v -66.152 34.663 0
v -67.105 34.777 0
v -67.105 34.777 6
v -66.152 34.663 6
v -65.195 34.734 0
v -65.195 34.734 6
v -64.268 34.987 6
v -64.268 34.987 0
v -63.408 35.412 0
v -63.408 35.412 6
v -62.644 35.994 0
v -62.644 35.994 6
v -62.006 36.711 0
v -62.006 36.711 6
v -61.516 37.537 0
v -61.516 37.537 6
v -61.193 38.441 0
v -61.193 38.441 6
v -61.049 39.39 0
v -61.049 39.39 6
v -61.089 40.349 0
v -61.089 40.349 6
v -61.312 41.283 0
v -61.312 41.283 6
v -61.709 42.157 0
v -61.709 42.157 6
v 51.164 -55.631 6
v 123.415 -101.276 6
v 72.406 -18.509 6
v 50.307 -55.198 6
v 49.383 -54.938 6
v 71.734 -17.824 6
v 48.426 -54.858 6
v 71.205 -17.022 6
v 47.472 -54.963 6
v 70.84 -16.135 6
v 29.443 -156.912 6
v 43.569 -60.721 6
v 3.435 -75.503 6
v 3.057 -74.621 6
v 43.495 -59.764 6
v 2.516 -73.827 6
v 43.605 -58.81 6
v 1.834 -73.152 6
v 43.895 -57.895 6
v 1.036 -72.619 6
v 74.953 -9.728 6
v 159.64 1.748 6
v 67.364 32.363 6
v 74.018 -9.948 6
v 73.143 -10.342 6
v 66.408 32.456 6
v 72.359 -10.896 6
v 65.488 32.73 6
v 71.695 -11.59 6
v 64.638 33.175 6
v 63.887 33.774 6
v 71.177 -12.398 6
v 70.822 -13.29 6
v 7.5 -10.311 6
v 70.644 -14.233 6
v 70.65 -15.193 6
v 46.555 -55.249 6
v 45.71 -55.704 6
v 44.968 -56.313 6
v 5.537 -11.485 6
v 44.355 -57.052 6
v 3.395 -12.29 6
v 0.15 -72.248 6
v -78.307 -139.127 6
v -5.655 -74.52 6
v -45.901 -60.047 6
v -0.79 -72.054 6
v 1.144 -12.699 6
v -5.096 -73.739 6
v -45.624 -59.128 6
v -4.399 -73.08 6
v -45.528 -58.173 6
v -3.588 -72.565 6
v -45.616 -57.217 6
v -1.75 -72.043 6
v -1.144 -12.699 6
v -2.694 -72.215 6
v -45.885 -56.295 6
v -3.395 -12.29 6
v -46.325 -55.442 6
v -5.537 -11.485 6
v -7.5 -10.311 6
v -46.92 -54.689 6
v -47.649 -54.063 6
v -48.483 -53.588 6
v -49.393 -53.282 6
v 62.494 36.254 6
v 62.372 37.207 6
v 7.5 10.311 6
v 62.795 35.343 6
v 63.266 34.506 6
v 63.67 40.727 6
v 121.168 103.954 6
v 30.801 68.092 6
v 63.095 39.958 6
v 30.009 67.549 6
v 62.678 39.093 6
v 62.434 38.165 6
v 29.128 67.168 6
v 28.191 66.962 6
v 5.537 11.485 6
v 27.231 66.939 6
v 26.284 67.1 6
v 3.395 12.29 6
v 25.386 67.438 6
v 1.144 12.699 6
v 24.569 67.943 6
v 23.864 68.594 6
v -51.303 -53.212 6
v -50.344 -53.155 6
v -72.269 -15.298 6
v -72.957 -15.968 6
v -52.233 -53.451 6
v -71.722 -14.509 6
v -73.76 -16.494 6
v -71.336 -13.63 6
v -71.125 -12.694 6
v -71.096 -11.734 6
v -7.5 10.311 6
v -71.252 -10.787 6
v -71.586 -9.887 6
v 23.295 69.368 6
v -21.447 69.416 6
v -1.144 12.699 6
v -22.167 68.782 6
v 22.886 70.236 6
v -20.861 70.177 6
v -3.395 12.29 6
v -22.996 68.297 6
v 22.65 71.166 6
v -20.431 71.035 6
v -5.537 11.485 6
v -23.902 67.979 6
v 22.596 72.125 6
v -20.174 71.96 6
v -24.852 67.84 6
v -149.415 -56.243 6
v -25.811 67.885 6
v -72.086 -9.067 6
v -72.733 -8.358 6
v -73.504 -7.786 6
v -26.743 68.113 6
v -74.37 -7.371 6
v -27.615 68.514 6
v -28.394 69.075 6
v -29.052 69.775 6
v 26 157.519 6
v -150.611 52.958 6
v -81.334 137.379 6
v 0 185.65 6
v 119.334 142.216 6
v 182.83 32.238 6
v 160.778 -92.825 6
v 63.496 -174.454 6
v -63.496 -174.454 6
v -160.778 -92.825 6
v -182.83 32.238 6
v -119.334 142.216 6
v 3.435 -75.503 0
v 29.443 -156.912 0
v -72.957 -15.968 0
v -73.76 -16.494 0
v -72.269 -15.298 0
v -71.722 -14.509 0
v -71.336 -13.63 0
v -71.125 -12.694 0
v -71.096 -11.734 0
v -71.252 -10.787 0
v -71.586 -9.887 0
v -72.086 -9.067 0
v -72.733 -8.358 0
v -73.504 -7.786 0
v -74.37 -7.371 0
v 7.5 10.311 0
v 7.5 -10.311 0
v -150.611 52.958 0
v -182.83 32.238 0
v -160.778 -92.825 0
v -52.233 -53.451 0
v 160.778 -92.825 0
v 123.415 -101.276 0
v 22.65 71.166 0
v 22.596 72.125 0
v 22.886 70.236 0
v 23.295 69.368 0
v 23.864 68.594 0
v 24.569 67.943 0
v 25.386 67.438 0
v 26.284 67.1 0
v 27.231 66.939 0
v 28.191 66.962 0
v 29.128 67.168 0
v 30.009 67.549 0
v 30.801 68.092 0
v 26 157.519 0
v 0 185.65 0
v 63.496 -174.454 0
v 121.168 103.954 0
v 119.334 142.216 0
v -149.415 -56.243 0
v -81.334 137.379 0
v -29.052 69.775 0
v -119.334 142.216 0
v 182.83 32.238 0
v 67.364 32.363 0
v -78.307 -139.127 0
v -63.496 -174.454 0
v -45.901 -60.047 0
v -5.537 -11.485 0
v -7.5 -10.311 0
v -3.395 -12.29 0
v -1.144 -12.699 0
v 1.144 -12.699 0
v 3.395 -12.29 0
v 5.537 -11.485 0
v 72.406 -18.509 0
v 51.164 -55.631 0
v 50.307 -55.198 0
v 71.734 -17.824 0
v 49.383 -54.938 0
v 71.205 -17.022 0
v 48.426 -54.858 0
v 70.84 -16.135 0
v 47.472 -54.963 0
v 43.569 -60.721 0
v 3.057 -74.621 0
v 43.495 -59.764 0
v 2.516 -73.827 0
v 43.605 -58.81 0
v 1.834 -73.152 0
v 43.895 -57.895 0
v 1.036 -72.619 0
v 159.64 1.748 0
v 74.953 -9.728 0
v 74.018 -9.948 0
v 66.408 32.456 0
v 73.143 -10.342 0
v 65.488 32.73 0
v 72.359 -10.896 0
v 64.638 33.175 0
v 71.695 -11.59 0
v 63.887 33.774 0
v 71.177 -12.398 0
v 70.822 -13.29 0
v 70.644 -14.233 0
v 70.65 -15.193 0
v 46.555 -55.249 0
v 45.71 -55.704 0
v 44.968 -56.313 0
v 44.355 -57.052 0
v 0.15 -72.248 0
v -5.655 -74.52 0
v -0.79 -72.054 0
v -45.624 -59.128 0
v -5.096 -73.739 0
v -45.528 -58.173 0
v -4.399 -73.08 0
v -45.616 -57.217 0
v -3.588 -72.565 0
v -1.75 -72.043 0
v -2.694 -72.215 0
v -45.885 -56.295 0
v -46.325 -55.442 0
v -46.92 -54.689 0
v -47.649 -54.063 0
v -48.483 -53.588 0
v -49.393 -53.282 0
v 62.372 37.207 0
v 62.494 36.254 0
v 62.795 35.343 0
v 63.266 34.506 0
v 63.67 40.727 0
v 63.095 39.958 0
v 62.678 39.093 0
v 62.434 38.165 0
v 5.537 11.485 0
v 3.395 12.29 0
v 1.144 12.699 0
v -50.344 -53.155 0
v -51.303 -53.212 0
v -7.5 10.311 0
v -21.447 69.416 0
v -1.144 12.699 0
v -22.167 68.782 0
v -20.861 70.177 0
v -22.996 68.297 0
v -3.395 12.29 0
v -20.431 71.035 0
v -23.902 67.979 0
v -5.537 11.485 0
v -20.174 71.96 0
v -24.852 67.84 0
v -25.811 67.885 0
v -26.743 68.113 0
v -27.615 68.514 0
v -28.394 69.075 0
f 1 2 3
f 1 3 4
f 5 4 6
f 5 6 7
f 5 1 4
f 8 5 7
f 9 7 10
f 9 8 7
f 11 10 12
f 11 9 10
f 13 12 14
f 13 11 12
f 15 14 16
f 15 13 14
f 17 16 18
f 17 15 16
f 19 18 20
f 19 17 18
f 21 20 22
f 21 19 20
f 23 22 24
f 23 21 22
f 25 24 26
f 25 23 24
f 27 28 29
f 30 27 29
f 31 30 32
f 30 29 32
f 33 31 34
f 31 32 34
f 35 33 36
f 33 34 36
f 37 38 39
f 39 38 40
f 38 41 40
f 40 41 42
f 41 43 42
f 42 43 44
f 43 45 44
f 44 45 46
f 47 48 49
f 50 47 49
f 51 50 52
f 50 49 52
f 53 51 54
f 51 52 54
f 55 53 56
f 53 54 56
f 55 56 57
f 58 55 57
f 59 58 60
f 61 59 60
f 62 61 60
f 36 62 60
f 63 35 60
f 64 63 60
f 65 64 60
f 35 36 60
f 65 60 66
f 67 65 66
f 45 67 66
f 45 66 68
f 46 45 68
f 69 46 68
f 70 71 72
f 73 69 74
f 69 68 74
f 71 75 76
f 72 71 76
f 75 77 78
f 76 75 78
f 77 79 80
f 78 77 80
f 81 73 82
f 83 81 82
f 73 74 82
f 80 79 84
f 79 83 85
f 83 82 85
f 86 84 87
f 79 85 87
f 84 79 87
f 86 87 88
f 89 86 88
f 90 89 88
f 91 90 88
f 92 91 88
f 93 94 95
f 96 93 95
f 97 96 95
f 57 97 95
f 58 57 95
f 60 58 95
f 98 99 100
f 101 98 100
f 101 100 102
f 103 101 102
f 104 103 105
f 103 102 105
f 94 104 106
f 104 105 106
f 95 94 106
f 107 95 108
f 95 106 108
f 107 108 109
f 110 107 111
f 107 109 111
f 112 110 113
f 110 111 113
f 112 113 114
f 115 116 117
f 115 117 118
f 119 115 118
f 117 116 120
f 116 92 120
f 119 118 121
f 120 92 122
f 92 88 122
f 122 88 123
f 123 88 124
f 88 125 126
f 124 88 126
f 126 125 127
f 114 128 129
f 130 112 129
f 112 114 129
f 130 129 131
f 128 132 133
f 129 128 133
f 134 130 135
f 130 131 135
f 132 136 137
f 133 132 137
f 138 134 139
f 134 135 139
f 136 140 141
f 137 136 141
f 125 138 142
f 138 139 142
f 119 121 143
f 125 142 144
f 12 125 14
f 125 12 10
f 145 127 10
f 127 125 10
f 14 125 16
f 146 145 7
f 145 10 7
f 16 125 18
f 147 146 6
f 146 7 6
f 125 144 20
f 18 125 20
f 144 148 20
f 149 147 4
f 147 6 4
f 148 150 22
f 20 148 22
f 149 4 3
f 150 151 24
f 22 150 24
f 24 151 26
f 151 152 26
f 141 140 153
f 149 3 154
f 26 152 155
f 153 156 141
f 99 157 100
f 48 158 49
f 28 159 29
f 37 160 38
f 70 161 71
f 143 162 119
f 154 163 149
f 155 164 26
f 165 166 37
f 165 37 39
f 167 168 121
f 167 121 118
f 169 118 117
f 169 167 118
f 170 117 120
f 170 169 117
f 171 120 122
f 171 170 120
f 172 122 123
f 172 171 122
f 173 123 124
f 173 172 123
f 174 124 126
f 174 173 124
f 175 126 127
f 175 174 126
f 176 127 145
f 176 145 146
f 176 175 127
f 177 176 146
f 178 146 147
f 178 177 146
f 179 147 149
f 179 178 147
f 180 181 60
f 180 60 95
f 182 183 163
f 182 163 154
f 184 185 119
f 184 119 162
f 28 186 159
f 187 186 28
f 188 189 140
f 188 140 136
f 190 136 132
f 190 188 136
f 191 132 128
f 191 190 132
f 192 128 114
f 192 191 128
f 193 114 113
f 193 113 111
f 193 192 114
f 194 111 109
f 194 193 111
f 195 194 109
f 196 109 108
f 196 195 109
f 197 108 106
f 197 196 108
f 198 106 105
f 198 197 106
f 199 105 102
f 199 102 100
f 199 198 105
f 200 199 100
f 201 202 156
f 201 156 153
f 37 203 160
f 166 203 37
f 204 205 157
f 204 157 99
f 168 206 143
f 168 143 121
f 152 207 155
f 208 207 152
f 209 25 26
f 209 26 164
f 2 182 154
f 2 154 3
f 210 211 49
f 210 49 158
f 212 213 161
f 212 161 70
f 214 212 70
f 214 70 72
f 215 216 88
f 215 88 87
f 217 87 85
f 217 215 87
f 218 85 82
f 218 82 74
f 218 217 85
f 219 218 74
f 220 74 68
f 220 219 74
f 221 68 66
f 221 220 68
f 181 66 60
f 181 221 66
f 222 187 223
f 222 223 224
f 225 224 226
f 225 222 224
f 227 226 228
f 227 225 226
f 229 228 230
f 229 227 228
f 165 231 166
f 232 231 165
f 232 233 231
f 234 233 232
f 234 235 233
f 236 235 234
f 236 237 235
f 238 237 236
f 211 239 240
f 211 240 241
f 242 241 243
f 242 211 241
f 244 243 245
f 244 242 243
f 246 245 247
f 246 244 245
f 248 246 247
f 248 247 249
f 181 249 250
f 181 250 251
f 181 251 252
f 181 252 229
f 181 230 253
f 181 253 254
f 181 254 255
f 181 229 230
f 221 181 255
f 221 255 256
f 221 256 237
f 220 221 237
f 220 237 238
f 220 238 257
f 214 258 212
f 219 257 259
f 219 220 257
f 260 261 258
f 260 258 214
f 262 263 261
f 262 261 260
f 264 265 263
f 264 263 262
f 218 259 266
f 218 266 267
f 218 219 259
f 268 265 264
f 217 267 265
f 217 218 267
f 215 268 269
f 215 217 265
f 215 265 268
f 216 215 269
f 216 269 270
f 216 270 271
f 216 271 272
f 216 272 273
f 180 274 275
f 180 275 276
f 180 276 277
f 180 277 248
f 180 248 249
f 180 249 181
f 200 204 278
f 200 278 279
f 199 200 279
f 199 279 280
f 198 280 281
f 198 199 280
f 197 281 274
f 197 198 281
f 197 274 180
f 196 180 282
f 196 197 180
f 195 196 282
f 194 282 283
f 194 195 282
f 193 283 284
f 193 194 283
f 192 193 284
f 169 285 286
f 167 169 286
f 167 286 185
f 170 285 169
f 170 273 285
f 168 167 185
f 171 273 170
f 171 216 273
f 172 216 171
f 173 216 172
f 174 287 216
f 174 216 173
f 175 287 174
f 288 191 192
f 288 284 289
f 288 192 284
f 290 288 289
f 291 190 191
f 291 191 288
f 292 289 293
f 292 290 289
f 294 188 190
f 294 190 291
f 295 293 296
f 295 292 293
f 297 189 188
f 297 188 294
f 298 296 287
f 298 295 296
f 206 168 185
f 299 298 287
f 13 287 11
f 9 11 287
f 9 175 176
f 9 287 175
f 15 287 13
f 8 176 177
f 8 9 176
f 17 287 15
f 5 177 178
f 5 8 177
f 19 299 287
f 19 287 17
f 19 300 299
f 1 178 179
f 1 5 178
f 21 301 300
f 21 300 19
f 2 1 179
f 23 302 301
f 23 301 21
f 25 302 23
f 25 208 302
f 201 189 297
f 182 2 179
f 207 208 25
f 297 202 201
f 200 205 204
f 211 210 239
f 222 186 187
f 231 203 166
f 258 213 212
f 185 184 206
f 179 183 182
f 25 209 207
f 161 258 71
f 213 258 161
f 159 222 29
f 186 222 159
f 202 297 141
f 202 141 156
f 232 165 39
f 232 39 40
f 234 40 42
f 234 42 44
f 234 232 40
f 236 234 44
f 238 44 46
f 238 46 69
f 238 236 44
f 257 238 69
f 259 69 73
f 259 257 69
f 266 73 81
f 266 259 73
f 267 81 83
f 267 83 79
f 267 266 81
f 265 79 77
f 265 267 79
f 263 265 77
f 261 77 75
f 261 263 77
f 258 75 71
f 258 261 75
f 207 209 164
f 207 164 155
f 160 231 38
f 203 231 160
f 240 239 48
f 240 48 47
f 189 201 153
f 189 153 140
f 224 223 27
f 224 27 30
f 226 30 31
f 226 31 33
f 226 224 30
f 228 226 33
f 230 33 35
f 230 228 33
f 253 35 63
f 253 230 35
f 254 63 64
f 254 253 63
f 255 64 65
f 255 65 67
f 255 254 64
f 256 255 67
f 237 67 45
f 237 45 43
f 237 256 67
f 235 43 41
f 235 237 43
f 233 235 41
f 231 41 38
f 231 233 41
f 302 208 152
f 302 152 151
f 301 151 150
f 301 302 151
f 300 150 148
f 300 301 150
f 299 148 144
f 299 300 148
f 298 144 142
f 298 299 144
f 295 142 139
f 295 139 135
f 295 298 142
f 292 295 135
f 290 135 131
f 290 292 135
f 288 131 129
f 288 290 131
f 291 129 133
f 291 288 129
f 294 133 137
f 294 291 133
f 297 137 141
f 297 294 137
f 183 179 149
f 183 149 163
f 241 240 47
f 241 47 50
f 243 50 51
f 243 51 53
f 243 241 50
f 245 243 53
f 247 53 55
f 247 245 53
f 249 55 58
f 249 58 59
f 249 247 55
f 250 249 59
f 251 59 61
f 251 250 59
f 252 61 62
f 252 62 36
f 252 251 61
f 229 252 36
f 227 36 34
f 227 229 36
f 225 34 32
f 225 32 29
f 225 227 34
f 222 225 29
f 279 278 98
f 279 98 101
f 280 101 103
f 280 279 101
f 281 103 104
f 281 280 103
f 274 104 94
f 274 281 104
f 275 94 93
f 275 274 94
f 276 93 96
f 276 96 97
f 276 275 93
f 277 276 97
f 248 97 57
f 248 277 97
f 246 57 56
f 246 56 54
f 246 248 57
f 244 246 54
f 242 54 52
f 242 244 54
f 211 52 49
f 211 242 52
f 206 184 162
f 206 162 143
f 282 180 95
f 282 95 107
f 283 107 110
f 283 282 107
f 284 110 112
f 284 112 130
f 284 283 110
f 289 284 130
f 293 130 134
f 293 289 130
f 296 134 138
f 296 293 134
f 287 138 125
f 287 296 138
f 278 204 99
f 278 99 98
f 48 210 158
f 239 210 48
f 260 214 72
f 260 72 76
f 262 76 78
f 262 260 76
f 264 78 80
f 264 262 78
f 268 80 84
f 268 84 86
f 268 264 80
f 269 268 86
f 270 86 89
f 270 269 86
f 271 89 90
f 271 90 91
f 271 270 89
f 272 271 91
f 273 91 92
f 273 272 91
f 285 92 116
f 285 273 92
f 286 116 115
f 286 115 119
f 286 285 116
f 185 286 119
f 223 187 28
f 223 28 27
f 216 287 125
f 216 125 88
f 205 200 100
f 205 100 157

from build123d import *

# Parameters (mm, degrees)
BOSS_EXTRU_1_DEPTH = 6


with BuildPart() as part:
    # Esquisse1 → Boss.-Extru.1 (new body)
    with BuildSketch(Plane.XY):
        with BuildLine():
            Line((-20.173501956, 71.960204906), (0, 185.65))
            Line((0, 185.65), (26, 157.518641754))
            Line((26, 157.518641754), (22.59550815, 72.124873891))
            ThreePointArc((22.59550815, 72.124873891), (25.386159845, 67.438342266), (30.801329033, 68.091992195))
            Line((30.801329033, 68.091992195), (119.333519738, 142.216150865))
            Line((119.333519738, 142.216150865), (121.168186735, 103.953802351))
            Line((121.168186735, 103.953802351), (63.670138745, 40.726746182))
            ThreePointArc((63.670138745, 40.726746182), (62.795457508, 35.34285834), (67.363875848, 32.362779578))
            Line((67.363875848, 32.362779578), (182.829559347, 32.237784184))
            Line((182.829559347, 32.237784184), (159.640432263, 1.747823511))
            Line((159.640432263, 1.747823511), (74.952803807, -9.727878693))
            ThreePointArc((74.952803807, -9.727878693), (70.822062709, -13.289941795), (72.406116488, -18.509337276))
            Line((72.406116488, -18.509337276), (160.777616213, -92.825))
            Line((160.777616213, -92.825), (123.415145329, -101.275981375))
            Line((123.415145329, -101.275981375), (51.16421896, -55.630721015))
            ThreePointArc((51.16421896, -55.630721015), (45.710237669, -55.704230463), (43.568730519, -60.72072951))
            Line((43.568730519, -60.72072951), (63.496039608, -174.453935049))
            Line((63.496039608, -174.453935049), (29.442540289, -156.911629019))
            Line((29.442540289, -156.911629019), (3.435327434, -75.503330707))
            ThreePointArc((3.435327434, -75.503330707), (-0.789915589, -72.053890614), (-5.654948672, -74.520217571))
            Line((-5.654948672, -74.520217571), (-63.496039608, -174.453935049))
            Line((-63.496039608, -174.453935049), (-78.30655657, -139.126581566))
            Line((-78.30655657, -139.126581566), (-45.900991977, -60.047092835))
            ThreePointArc((-45.900991977, -60.047092835), (-46.920458564, -54.688734557), (-52.232614532, -53.45086763))
            Line((-52.232614532, -53.45086763), (-160.777616213, -92.825))
            Line((-160.777616213, -92.825), (-149.415145329, -56.242660379))
            Line((-149.415145329, -56.242660379), (-73.75972711, -16.494152877))
            ThreePointArc((-73.75972711, -16.494152877), (-71.096397514, -11.734111803), (-74.370059552, -7.371262685))
            Line((-74.370059552, -7.371262685), (-182.829559347, 32.237784184))
            Line((-182.829559347, 32.237784184), (-150.610727024, 52.957826667))
            Line((-150.610727024, 52.957826667), (-67.10546618, 34.776584525))
            ThreePointArc((-67.10546618, 34.776584525), (-62.005541919, 36.711032274), (-61.708927176, 42.157437993))
            Line((-61.708927176, 42.157437993), (-119.333519738, 142.216150865))
            Line((-119.333519738, 142.216150865), (-81.333875693, 137.378758055))
            Line((-81.333875693, 137.378758055), (-29.05181183, 69.774971528))
            ThreePointArc((-29.05181183, 69.774971528), (-23.901604145, 67.978676352), (-20.173501956, 71.960204906))
        make_face()
        with BuildLine():
            Line((-7.5, 10.310795314), (-7.5, -10.310795314))
            ThreePointArc((-7.5, -10.310795314), (0, -12.75), (7.5, -10.310795314))
            Line((7.5, -10.310795314), (7.5, 10.310795314))
            ThreePointArc((7.5, 10.310795314), (0, 12.75), (-7.5, 10.310795314))
        make_face(mode=Mode.SUBTRACT)
    extrude(amount=BOSS_EXTRU_1_DEPTH)


solid = part.part
